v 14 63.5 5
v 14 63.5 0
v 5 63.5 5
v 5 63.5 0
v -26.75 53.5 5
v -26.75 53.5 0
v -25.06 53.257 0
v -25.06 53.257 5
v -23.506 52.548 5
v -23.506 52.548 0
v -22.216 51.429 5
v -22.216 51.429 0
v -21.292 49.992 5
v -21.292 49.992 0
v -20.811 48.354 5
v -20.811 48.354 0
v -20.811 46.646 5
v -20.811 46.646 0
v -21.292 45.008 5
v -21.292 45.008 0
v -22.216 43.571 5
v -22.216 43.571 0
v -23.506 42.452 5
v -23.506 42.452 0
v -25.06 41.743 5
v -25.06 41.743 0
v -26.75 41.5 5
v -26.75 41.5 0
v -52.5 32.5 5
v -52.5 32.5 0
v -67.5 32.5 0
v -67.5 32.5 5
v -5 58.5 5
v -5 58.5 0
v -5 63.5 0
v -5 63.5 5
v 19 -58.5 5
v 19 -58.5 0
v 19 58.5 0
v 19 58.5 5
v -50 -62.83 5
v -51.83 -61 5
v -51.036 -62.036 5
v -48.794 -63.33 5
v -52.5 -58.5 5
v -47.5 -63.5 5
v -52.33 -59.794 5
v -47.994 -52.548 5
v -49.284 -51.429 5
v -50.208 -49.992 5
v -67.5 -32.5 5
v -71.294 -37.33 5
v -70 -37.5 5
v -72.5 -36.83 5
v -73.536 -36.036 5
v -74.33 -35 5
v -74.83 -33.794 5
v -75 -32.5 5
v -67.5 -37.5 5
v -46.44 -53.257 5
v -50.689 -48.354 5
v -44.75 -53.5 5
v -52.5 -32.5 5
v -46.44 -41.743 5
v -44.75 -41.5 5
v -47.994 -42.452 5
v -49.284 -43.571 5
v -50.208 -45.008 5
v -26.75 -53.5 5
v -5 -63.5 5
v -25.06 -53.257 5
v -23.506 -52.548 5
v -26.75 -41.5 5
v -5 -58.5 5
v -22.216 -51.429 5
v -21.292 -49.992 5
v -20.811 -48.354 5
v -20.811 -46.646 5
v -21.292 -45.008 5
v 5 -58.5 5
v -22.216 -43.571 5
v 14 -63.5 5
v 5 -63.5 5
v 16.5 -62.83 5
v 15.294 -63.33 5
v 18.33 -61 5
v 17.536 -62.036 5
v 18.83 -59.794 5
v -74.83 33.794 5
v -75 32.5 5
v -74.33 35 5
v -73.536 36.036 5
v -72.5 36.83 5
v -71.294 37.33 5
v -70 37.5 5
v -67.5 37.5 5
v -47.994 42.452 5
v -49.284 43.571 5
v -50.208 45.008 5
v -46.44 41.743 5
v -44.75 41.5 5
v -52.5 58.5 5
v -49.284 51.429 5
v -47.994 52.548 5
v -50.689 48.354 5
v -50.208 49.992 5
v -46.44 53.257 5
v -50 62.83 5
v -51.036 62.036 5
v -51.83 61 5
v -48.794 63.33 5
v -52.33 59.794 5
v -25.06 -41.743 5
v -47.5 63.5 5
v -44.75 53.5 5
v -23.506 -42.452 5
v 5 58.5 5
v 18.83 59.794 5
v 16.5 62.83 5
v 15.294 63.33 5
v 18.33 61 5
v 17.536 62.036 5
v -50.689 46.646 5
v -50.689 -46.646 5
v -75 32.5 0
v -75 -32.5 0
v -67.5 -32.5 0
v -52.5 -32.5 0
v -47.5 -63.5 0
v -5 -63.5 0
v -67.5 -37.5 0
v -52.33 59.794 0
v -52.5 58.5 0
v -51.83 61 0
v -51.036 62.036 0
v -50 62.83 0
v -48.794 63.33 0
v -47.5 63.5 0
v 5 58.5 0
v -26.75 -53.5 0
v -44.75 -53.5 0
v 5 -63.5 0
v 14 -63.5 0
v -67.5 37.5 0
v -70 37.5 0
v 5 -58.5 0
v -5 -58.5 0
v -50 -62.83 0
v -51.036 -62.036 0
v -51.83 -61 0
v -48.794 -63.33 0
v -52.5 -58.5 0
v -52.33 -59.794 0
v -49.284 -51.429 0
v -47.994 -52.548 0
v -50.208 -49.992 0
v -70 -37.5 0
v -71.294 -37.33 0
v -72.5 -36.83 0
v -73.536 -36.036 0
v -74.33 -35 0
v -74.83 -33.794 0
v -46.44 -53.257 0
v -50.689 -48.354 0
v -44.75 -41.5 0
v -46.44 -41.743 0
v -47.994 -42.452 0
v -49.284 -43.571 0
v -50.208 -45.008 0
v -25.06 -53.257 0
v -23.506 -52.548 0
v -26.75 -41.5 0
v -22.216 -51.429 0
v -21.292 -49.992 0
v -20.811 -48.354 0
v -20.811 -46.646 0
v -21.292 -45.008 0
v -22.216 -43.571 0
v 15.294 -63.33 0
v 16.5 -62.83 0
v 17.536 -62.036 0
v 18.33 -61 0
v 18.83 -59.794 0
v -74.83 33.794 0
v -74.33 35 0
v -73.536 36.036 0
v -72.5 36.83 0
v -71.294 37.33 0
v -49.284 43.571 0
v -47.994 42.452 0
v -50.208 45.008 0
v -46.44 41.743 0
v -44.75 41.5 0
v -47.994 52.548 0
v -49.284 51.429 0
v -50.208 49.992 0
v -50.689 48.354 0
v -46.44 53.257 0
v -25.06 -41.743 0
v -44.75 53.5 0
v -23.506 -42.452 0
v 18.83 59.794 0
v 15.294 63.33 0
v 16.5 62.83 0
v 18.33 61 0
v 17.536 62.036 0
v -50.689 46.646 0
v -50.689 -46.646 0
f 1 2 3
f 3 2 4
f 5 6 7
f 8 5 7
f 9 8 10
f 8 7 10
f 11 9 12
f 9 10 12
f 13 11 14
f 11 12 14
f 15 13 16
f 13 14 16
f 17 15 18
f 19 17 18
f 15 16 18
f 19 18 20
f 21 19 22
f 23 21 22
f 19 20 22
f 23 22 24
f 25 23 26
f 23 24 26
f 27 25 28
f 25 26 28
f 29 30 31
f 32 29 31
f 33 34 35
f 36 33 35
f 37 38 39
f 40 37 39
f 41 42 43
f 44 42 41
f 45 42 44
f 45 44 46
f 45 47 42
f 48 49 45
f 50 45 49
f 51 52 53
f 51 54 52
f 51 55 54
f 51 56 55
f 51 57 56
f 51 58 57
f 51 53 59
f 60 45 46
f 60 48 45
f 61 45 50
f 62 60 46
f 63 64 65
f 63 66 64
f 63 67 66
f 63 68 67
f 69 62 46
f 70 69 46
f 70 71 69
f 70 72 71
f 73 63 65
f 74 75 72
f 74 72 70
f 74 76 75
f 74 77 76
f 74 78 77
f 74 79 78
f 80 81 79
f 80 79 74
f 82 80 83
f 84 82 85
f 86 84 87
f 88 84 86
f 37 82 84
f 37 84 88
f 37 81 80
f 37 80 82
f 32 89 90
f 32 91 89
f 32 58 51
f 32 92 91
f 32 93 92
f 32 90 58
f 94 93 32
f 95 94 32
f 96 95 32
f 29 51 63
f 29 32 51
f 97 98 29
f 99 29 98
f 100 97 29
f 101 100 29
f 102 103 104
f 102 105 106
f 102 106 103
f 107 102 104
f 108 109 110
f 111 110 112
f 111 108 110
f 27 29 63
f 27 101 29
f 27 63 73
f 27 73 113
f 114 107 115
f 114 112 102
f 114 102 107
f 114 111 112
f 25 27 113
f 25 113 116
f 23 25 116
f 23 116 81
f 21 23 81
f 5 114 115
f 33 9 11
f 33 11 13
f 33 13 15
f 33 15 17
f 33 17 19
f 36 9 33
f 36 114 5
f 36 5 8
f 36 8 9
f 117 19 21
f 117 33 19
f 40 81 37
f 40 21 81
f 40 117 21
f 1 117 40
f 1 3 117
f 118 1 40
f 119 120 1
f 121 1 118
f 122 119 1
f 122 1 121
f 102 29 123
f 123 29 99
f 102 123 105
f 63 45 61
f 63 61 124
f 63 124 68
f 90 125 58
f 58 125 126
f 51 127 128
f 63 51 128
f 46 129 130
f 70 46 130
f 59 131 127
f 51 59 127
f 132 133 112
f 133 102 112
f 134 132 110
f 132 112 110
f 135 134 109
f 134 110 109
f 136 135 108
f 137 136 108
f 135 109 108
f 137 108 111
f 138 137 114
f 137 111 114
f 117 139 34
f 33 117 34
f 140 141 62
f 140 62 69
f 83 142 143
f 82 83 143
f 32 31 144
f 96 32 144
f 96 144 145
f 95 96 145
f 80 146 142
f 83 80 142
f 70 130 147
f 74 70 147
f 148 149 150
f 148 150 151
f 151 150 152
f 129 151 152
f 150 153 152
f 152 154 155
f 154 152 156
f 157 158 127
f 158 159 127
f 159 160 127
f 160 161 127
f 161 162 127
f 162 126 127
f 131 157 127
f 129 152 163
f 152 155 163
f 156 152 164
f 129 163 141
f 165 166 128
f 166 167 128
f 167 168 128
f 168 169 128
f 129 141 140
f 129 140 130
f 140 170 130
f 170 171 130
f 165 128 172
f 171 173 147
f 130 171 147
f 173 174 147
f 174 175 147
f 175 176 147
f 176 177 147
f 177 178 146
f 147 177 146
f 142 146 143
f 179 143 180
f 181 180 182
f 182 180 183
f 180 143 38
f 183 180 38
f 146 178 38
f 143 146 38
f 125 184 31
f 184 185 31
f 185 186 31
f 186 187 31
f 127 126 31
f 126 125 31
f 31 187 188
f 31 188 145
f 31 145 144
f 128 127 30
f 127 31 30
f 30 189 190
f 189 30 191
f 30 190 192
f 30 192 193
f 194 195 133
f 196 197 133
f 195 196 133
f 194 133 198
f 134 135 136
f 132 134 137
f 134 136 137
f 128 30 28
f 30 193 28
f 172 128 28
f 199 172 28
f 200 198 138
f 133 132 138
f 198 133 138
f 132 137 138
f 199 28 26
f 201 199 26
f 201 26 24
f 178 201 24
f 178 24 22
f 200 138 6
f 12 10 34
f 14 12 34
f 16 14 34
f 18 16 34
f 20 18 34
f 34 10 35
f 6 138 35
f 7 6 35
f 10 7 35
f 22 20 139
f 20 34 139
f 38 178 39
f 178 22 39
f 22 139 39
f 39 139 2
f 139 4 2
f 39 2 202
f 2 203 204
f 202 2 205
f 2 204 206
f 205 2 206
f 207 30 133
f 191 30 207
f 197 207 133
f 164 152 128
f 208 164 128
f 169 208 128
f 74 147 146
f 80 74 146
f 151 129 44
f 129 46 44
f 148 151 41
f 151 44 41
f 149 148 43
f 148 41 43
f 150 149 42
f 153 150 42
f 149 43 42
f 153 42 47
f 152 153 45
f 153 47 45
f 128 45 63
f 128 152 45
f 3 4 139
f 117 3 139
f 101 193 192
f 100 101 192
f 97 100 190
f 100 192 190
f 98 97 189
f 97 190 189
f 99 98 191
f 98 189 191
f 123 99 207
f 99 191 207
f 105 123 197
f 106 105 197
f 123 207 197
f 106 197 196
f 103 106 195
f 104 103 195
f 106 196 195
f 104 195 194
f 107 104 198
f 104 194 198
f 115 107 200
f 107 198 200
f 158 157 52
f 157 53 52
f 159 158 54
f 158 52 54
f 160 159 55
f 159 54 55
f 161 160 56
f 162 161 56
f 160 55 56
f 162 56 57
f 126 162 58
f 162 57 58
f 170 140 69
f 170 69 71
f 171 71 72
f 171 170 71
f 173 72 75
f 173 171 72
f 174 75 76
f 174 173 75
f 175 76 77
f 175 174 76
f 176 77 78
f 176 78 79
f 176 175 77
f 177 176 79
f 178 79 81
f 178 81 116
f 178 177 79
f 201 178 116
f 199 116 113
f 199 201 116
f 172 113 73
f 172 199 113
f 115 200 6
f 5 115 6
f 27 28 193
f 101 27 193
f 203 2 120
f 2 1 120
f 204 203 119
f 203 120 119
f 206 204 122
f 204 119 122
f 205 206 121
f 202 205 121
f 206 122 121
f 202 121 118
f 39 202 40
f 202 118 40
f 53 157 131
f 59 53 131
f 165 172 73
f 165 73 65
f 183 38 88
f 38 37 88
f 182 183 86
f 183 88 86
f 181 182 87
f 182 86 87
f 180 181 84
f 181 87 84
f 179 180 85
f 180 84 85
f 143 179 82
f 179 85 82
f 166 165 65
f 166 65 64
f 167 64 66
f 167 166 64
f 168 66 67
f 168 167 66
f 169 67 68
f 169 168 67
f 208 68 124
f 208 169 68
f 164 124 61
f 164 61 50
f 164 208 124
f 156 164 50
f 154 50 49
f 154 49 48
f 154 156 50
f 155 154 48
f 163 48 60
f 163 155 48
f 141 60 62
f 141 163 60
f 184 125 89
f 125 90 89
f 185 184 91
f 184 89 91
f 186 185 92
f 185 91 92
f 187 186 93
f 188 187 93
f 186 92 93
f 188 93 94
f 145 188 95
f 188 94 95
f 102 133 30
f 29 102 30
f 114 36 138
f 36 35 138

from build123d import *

# Parameters (mm, degrees)
BOSS_EXTRUDE2_DEPTH = 5
FILLET2_R           = 5


with BuildPart() as part:
    # Sketch2 → Boss-Extrude2 (new body)
    with BuildSketch(Plane.XY):
        Polygon((-52.5, -63.5), (-5, -63.5), (-5, -58.5), (5, -58.5), (5, -63.5), (19, -63.5), (19, 63.5), (5, 63.5), (5, 58.5), (-5, 58.5), (-5, 63.5), (-52.5, 63.5), (-52.5, 32.5), (-67.5, 32.5), (-67.5, 37.5), (-75, 37.5), (-75, -37.5), (-67.5, -37.5), (-67.5, -32.5), (-52.5, -32.5), align=None)
        with BuildLine():
            ThreePointArc((-44.75, -53.5), (-50.75, -47.5), (-44.75, -41.5))
            Line((-44.75, -41.5), (-26.75, -41.5))
            ThreePointArc((-26.75, -41.5), (-20.75, -47.5), (-26.75, -53.5))
            Line((-26.75, -53.5), (-44.75, -53.5))
        make_face(mode=Mode.SUBTRACT)
        with BuildLine():
            Line((-44.75, 53.5), (-26.75, 53.5))
            ThreePointArc((-26.75, 53.5), (-20.75, 47.5), (-26.75, 41.5))
            Line((-26.75, 41.5), (-44.75, 41.5))
            ThreePointArc((-44.75, 41.5), (-50.75, 47.5), (-44.75, 53.5))
        make_face(mode=Mode.SUBTRACT)
    extrude(amount=BOSS_EXTRUDE2_DEPTH)

    # Fillet2
    fillet2_edges = [part.edges().sort_by_distance(p)[0] for p in [
        (-75, -37.5, 2.5),
        (-52.5, 63.5, 2.5),
        (19, 63.5, 2.5),
        (19, -63.5, 2.5),
        (-52.5, -63.5, 2.5),
        (-75, 37.5, 2.5),
    ]]
    fillet(fillet2_edges, radius=FILLET2_R)


solid = part.part
